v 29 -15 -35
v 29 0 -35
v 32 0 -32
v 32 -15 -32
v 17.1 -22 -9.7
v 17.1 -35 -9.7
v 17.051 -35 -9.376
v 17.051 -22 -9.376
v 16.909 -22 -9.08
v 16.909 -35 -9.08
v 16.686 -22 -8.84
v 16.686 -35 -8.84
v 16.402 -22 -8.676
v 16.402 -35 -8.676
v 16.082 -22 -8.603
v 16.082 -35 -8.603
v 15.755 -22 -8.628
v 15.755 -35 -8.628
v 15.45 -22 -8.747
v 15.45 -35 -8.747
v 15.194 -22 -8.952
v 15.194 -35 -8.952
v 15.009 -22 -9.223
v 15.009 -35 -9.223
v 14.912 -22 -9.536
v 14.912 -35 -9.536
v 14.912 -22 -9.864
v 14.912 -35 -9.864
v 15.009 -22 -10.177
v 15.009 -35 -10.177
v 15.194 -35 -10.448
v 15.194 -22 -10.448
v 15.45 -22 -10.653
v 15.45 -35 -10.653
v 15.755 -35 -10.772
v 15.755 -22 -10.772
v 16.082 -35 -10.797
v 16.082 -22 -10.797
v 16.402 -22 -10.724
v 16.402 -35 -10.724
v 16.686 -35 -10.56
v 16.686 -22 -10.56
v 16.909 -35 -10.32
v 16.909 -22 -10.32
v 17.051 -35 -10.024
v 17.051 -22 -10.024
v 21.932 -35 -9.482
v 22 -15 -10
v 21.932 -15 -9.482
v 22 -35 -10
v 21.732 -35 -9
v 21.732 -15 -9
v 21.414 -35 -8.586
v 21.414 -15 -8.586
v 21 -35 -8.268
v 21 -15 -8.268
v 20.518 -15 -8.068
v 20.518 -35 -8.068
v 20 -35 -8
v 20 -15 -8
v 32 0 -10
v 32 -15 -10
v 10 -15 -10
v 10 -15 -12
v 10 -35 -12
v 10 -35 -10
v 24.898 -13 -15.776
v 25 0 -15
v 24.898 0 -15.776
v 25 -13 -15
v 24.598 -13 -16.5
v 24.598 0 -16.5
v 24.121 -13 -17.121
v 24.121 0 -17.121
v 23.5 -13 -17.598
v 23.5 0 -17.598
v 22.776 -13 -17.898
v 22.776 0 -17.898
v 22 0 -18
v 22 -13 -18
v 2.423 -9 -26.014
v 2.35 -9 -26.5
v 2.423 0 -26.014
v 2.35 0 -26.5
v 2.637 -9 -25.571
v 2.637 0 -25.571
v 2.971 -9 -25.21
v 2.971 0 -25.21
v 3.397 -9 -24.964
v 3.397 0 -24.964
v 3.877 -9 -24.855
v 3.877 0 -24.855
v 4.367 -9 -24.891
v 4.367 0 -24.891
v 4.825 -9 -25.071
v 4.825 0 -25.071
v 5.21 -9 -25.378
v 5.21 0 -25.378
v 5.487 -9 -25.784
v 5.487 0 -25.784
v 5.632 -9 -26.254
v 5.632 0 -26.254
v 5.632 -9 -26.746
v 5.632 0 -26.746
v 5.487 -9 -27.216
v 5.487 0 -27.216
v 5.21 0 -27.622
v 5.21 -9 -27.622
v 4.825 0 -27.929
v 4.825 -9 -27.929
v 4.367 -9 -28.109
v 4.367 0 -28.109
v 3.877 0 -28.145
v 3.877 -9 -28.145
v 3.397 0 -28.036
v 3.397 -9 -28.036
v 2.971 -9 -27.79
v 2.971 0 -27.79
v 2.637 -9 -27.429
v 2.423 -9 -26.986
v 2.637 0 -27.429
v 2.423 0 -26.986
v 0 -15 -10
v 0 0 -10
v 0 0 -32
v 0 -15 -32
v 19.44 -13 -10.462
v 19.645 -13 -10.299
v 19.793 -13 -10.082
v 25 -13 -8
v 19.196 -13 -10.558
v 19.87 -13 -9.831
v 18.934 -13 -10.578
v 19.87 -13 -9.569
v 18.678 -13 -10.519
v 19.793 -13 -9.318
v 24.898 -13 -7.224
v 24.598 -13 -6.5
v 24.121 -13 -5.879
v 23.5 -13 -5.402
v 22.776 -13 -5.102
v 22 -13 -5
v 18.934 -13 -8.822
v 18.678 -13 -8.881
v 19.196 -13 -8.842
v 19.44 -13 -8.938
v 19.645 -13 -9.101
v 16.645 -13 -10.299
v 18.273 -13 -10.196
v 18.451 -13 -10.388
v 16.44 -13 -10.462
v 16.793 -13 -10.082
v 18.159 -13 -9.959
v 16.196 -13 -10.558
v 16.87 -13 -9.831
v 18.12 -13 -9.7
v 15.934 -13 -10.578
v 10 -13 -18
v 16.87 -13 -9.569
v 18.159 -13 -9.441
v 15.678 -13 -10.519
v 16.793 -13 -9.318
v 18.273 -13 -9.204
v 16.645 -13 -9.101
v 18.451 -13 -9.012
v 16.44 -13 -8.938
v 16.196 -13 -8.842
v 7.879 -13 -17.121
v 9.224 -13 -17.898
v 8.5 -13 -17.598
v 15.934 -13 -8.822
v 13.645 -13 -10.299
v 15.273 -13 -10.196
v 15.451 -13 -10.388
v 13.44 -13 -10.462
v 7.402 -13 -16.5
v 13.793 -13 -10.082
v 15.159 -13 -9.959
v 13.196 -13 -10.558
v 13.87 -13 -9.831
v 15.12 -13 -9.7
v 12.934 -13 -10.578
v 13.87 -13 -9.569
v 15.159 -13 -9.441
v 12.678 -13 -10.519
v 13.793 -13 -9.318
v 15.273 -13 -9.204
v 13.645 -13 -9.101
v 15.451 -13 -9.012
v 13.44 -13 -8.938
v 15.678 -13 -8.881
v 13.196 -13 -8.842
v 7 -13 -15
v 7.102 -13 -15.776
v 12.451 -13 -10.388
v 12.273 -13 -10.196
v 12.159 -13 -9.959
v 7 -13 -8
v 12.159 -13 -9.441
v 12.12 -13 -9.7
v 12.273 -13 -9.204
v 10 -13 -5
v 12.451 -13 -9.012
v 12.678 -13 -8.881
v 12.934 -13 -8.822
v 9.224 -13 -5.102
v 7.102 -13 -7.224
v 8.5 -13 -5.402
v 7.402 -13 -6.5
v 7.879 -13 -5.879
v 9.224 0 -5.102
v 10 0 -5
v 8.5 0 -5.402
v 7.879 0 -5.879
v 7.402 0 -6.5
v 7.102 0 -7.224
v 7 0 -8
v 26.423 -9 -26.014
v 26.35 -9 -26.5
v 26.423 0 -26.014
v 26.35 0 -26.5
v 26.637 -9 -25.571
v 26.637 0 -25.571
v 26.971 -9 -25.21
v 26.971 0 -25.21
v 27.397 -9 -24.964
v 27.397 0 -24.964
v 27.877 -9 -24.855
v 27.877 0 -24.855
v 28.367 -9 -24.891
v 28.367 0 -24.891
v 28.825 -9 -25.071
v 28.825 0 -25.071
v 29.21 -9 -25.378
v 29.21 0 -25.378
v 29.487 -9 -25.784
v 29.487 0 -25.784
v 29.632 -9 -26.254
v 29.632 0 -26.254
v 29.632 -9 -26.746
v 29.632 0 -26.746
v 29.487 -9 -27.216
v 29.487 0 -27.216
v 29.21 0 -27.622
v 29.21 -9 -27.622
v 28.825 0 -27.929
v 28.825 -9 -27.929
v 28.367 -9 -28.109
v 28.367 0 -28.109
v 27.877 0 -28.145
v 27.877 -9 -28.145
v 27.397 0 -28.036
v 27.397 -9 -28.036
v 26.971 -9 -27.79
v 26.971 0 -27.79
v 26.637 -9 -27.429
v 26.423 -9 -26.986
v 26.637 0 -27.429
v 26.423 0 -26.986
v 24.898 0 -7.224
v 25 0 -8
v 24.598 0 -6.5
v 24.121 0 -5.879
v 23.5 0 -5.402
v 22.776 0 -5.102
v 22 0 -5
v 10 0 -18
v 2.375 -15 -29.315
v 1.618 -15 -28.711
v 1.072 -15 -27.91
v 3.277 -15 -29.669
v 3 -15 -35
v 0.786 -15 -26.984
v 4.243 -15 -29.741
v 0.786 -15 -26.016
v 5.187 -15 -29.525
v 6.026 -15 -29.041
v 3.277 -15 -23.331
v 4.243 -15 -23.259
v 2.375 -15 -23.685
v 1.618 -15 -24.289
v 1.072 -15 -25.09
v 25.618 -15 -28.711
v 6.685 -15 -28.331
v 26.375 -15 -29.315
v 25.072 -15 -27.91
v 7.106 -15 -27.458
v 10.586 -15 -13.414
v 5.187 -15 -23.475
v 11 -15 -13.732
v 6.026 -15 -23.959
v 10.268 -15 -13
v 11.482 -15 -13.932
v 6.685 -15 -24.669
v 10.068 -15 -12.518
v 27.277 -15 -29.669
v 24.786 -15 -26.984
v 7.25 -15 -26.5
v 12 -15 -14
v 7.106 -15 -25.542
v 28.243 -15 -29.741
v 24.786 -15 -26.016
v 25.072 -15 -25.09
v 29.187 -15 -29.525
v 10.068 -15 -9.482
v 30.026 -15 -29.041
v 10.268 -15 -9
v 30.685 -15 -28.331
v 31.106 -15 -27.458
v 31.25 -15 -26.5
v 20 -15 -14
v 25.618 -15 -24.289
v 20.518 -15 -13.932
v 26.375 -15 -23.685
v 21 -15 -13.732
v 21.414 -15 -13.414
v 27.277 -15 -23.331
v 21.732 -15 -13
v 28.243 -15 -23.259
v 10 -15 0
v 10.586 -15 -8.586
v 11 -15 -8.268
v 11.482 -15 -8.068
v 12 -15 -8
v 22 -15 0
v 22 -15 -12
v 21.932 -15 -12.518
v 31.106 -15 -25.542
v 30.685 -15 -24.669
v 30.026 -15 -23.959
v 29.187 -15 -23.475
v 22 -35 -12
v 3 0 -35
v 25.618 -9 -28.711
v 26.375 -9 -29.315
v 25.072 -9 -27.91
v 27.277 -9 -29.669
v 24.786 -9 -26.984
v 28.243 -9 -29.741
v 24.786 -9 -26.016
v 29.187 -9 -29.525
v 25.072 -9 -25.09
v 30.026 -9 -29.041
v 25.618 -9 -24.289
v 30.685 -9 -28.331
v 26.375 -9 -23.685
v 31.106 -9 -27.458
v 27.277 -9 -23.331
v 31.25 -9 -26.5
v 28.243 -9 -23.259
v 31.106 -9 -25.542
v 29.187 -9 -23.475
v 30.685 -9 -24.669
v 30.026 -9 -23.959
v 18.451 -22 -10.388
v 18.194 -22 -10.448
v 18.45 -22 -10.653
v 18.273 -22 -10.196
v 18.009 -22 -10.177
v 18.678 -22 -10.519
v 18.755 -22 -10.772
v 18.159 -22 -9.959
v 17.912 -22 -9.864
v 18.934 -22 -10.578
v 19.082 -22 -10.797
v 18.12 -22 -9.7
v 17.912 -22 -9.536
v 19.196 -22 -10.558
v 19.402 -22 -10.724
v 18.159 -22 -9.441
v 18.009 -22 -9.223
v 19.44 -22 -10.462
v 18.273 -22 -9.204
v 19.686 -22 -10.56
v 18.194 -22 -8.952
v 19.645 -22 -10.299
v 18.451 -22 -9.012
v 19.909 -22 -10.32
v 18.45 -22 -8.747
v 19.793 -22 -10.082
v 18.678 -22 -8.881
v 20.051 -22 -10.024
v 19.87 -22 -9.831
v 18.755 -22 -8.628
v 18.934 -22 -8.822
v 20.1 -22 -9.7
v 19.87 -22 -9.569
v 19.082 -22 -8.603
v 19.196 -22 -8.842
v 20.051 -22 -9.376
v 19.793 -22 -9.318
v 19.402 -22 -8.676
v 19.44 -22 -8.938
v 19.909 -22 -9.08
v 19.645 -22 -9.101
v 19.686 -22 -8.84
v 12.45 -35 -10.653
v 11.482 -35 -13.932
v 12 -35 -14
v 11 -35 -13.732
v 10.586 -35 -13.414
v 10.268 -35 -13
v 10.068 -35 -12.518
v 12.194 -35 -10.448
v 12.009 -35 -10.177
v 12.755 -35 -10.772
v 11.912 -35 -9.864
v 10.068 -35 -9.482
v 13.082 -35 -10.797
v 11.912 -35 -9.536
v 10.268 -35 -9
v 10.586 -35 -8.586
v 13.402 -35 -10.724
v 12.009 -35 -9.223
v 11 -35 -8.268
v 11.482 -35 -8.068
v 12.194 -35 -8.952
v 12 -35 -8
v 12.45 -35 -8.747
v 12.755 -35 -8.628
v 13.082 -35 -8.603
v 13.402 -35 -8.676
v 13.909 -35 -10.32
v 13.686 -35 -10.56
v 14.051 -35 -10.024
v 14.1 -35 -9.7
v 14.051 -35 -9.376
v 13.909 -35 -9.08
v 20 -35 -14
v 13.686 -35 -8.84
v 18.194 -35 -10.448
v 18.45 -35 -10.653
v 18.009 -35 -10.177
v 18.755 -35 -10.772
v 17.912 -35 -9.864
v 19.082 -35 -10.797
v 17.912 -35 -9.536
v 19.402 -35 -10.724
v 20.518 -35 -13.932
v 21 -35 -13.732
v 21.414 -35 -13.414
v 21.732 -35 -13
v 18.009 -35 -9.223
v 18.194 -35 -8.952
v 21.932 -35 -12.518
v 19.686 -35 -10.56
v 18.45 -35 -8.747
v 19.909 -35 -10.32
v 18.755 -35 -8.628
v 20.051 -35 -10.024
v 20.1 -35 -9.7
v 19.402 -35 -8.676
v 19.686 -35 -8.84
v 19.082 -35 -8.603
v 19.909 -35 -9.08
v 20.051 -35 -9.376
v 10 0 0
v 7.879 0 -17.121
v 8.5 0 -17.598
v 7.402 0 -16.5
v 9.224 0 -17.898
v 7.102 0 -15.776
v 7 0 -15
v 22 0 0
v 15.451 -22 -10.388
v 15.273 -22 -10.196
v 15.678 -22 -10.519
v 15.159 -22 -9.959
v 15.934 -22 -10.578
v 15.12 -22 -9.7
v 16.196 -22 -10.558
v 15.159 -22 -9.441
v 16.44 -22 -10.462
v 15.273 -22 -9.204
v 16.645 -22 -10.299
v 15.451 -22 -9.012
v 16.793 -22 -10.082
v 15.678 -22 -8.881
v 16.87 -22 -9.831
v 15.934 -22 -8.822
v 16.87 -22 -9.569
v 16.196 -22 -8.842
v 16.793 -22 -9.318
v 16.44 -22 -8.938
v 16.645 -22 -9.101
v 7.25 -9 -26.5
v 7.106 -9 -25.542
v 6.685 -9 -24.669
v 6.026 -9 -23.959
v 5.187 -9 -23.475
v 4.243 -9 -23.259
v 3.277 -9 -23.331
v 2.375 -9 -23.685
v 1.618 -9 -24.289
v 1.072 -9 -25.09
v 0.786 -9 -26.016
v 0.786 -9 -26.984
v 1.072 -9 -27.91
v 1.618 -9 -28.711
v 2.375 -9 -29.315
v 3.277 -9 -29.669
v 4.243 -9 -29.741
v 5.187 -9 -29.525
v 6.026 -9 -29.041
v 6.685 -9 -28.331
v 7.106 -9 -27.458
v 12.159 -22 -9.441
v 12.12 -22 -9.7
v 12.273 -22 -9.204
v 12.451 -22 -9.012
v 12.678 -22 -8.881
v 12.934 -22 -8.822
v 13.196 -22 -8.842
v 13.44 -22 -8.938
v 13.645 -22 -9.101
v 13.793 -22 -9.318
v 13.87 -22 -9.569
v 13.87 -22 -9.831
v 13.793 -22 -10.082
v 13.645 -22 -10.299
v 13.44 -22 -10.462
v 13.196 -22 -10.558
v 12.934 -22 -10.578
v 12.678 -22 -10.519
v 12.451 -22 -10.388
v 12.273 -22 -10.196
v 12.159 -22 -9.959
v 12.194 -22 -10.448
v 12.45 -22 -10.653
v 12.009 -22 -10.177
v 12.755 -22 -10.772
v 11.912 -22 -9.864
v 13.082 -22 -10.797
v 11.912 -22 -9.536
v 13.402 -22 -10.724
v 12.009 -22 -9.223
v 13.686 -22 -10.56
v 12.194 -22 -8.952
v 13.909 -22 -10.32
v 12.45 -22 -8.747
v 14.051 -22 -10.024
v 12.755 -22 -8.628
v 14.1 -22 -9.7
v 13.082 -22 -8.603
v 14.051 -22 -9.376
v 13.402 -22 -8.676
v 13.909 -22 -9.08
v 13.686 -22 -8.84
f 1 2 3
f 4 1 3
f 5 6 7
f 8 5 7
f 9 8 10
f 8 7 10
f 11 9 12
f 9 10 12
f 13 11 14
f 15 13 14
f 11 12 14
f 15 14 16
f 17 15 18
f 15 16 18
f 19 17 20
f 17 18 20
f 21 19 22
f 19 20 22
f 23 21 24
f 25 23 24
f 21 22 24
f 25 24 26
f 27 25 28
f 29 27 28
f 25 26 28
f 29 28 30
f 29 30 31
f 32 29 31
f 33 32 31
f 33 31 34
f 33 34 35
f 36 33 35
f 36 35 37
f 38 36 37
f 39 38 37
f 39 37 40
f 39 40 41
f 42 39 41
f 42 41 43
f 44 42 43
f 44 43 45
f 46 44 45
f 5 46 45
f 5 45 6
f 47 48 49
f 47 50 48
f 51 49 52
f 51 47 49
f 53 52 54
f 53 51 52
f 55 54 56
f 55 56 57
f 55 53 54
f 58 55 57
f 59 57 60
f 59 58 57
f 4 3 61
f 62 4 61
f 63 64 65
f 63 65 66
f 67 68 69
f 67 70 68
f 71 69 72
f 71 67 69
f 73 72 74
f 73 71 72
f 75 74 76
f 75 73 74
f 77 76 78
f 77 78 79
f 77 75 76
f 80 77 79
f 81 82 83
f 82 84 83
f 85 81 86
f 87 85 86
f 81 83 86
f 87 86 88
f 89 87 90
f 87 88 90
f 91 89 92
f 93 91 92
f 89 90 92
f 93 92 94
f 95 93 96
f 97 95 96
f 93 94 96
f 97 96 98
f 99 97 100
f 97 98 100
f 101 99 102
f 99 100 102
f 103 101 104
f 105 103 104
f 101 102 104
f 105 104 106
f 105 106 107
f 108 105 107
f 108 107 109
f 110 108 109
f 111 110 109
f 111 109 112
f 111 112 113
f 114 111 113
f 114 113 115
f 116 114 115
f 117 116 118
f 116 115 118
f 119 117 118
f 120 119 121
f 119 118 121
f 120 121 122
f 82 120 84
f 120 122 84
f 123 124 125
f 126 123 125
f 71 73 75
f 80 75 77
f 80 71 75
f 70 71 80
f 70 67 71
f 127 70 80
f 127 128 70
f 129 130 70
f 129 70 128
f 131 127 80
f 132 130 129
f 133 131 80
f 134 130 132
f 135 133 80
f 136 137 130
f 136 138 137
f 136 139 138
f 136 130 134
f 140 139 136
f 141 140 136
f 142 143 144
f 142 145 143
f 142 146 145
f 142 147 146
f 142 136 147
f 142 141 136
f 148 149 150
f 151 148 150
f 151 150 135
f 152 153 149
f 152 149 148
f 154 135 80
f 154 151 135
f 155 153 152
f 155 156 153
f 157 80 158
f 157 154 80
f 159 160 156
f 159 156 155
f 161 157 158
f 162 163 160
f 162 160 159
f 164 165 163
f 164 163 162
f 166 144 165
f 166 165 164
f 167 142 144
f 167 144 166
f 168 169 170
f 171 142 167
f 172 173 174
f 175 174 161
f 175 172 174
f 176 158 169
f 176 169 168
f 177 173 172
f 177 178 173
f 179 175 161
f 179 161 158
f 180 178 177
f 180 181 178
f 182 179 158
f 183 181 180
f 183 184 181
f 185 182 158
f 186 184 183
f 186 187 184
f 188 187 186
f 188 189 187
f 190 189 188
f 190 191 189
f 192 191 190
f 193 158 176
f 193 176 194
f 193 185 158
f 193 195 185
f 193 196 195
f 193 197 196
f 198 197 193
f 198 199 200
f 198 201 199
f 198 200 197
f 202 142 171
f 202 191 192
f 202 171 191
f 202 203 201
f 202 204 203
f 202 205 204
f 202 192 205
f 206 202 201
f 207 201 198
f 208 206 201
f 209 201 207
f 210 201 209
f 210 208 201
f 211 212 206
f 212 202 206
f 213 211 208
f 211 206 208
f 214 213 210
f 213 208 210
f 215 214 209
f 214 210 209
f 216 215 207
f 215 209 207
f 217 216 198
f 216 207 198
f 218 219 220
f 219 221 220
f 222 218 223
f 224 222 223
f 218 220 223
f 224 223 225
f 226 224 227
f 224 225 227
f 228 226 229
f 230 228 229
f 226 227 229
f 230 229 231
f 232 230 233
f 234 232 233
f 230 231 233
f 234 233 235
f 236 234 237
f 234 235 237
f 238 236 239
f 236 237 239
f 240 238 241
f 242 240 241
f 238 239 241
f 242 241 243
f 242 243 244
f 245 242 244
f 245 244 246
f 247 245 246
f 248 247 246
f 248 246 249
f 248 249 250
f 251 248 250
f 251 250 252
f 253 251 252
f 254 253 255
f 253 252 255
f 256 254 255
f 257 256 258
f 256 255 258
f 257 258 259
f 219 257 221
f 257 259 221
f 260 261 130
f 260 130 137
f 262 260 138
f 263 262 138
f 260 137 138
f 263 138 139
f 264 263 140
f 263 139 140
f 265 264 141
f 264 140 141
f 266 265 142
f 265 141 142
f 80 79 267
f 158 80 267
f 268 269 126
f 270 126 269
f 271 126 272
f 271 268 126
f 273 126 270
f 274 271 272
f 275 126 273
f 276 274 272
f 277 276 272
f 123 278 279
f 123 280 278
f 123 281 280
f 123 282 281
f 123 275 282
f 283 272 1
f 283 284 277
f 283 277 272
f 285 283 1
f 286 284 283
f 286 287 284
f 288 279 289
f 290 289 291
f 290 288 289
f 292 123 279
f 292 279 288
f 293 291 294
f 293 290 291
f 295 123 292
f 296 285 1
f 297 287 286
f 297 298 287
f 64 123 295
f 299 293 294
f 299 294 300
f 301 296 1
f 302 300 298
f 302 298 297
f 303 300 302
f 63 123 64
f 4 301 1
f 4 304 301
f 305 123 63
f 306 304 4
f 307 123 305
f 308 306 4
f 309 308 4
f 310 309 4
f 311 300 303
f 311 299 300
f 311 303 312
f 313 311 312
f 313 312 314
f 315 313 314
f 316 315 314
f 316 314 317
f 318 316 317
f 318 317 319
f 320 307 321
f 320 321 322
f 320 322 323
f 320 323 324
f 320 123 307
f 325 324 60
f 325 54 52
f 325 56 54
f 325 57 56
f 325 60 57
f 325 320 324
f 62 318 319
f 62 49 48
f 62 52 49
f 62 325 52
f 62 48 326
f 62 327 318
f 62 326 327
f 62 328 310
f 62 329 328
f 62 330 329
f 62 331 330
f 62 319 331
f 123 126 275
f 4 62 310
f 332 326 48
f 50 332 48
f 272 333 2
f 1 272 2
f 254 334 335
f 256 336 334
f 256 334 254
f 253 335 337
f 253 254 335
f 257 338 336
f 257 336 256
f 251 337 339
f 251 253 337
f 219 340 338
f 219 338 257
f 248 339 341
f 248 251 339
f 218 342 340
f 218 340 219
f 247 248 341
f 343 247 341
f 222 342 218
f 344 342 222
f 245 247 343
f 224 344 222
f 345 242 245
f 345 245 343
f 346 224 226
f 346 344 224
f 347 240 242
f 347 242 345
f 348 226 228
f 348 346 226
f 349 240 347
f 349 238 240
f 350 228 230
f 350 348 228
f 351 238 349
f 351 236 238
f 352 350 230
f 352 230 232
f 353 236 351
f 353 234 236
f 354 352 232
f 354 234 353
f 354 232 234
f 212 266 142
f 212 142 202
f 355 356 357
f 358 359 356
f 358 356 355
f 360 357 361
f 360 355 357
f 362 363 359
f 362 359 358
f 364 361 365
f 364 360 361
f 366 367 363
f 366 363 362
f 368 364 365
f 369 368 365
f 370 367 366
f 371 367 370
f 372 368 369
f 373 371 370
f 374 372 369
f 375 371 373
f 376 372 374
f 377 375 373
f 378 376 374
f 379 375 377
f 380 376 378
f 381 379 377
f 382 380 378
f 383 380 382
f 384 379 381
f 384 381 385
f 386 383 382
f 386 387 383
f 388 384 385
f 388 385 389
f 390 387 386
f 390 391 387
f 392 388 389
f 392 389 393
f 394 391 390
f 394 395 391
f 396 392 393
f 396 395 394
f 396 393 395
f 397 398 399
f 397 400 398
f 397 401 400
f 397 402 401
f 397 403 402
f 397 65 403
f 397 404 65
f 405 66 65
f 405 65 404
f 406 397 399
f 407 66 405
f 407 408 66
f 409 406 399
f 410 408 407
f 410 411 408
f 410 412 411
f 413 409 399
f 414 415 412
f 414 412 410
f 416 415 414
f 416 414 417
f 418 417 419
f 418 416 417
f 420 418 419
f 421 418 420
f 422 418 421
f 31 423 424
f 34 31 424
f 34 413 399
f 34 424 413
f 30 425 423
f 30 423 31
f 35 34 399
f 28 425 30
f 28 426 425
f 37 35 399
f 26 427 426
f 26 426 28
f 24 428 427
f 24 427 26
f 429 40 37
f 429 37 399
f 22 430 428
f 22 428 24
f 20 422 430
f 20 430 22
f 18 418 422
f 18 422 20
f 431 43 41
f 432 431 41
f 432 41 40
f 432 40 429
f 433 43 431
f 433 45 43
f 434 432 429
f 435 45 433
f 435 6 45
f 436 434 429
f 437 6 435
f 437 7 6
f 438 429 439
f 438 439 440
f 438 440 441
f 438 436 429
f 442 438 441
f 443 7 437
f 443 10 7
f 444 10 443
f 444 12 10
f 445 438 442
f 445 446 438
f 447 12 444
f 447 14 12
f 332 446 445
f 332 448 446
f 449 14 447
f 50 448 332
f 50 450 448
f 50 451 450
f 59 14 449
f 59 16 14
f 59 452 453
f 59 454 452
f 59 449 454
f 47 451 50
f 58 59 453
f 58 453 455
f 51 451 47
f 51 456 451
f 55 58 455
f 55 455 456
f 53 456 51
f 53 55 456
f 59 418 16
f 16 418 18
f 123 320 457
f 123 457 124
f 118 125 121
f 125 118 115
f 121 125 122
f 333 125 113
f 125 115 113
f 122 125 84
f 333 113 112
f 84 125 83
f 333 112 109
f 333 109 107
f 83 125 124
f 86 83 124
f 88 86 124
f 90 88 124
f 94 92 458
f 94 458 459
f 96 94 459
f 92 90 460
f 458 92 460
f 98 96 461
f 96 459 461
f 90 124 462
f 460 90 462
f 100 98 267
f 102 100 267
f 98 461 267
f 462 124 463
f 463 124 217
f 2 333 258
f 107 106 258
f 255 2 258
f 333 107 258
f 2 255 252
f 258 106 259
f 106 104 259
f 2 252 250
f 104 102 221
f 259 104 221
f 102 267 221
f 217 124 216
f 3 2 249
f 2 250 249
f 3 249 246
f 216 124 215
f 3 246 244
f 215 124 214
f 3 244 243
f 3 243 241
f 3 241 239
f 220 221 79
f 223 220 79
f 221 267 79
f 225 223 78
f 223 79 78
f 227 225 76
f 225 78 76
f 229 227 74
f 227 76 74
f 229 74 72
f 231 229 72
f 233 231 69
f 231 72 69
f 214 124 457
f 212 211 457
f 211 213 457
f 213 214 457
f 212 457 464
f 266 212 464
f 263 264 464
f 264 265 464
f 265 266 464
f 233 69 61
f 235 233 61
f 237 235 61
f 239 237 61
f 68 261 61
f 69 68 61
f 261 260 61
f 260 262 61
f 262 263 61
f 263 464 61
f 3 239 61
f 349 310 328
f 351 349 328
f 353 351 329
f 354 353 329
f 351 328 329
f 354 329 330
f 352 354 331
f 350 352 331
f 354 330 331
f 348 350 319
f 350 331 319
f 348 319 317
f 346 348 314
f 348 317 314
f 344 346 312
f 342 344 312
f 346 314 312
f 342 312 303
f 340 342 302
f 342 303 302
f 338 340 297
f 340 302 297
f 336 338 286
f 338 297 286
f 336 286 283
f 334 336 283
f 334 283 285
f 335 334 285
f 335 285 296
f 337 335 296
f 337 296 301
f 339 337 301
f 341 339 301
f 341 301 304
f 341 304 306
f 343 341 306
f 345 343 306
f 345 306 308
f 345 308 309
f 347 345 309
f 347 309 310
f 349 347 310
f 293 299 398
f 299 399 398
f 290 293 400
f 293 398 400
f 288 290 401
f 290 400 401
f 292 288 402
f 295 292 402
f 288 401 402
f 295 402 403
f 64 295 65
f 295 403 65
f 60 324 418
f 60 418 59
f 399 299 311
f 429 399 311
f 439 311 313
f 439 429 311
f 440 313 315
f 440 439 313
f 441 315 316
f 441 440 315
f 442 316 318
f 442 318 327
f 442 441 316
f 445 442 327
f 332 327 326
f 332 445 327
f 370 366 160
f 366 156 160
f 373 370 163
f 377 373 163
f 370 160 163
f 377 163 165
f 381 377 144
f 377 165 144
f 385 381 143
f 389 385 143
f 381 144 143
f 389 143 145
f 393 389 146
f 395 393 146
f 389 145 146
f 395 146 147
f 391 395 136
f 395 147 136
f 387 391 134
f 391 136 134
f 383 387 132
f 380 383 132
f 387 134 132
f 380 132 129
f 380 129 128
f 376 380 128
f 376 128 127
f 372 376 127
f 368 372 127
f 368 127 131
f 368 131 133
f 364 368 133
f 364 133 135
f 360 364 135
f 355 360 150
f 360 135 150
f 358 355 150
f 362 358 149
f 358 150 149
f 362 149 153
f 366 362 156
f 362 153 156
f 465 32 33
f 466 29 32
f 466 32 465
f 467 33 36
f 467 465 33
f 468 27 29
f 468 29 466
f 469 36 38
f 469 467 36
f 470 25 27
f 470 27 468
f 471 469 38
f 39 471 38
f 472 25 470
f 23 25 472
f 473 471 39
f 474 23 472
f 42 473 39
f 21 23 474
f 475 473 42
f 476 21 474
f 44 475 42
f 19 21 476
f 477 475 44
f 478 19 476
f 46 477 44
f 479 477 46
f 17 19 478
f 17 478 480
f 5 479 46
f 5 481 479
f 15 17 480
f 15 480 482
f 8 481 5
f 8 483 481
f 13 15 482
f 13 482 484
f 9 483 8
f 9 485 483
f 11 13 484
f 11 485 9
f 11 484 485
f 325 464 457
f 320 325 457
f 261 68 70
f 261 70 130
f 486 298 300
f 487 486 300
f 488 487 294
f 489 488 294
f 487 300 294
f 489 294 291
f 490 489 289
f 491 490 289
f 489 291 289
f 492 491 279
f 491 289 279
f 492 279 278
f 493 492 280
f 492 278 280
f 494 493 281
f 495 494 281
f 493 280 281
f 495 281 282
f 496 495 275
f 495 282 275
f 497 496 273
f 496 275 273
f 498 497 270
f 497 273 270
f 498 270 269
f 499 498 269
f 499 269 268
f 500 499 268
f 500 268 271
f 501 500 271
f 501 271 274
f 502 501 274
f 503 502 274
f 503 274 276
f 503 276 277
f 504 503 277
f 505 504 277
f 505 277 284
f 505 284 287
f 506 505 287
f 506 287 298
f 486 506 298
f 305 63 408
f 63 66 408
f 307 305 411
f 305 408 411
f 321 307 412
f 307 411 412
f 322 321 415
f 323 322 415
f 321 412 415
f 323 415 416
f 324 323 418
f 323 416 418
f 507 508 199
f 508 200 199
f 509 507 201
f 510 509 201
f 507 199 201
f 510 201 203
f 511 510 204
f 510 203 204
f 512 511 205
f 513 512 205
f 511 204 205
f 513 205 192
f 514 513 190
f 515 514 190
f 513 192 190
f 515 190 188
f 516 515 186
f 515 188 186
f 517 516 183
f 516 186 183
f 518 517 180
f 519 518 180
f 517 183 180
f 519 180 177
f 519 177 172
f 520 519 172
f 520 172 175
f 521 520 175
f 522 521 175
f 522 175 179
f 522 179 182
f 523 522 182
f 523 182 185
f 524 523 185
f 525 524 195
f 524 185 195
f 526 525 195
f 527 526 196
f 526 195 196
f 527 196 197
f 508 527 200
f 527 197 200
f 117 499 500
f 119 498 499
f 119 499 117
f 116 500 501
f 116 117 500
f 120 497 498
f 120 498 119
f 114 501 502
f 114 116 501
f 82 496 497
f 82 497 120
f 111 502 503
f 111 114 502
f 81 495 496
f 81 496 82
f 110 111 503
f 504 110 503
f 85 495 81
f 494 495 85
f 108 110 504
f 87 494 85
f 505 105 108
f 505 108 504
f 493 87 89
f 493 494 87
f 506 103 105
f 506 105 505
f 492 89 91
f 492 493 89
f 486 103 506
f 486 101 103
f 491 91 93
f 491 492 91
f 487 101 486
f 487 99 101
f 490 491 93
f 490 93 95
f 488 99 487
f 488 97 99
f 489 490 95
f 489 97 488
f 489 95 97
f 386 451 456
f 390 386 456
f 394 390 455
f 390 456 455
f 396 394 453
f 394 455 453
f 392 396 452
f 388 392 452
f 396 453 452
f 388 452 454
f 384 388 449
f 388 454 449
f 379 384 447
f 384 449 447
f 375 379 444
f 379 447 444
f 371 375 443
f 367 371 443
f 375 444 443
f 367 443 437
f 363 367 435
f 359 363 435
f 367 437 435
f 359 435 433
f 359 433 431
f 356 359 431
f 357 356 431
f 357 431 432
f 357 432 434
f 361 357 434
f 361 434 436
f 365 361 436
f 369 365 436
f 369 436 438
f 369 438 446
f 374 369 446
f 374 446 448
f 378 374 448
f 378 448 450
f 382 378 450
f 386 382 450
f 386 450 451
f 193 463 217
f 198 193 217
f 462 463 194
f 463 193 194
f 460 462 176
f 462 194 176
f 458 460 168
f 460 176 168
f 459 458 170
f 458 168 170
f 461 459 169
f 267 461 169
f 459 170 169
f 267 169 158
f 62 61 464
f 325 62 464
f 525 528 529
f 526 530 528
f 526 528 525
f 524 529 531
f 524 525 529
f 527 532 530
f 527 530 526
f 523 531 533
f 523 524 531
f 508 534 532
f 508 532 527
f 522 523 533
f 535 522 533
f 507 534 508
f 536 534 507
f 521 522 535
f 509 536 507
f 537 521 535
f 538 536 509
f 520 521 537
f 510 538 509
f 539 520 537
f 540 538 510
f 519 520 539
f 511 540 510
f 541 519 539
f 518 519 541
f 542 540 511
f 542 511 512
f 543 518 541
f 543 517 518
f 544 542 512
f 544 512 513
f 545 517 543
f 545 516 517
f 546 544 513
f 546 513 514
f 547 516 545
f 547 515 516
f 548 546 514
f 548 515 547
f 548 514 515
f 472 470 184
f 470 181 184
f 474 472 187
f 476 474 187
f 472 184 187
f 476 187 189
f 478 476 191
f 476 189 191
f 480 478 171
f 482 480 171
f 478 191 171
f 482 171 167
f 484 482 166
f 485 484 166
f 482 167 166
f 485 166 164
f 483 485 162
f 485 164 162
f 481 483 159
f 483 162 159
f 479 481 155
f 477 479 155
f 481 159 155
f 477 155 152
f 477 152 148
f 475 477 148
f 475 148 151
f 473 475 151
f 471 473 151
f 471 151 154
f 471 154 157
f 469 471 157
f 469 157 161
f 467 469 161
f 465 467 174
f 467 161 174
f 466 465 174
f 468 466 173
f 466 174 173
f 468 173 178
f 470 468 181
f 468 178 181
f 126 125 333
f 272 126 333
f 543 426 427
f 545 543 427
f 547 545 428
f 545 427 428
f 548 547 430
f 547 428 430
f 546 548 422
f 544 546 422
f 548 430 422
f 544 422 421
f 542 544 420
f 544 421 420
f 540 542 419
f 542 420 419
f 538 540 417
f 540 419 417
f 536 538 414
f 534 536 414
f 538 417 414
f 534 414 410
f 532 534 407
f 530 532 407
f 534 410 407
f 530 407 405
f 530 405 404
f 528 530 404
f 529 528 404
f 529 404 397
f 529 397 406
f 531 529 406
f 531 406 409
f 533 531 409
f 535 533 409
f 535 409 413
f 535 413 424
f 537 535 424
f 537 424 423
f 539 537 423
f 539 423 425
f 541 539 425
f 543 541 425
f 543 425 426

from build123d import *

# Parameters (mm, degrees)
F1_DEPTH        = 15
F2_W            = 12
F2_H            = 6
F3_DEPTH        = 20
F4_W            = 18
F4_H            = 13
F5_DEPTH        = 13
F6_R            = 3
F7_D            = 3.3
F7_CBORE_D      = 6.5
F7_CBORE_DEPTH  = 6
F9_R            = 2
F10_D           = 1.76
F10_CBORE_D     = 2.2
F10_CBORE_DEPTH = 13


with BuildPart() as f1:
    # F0 (on Front) → F1 (new body)
    with BuildSketch(Plane.XZ):
        Polygon((22, 0), (10, 0), (0, -10), (0, -32), (3, -35), (29, -35), (32, -32), (32, -10), align=None)
    extrude(amount=F1_DEPTH)

    # F2 (on face) → F3 (join)
    with BuildSketch(Plane.XZ.offset(15)):
        with Locations((16, -11)):
            Rectangle(F2_W, F2_H)
    extrude(amount=F3_DEPTH)

    # F4 (on face) → F5 (cut)
    with BuildSketch(Plane(origin=(0, 0, 0), x_dir=(-1, 0, 0), z_dir=(0, 1, 0))):
        with Locations((-16, -11.5)):
            Rectangle(F4_W, F4_H)
    extrude(amount=-F5_DEPTH, mode=Mode.SUBTRACT)

    # F6
    f6_edges = [f1.edges().sort_by_distance(p)[0] for p in [
        (25, -6.5, -5),
        (7, -6.5, -5),
        (25, -6.5, -18),
        (7, -6.5, -18),
    ]]
    fillet(f6_edges, radius=F6_R)

    # F7 (through all)
    with Locations(Plane.XZ.offset(15)):
        with Locations((4, -26.5), (28, -26.5)):
            CounterBoreHole(F7_D / 2, F7_CBORE_D / 2, F7_CBORE_DEPTH)

    # F9
    f9_edges = [f1.edges().sort_by_distance(p)[0] for p in [
        (22, -25, -8),
        (22, -25, -14),
        (10, -25, -8),
        (10, -25, -14),
    ]]
    fillet(f9_edges, radius=F9_R)

    # F10 (through all)
    with Locations(Plane.XZ.offset(35)):
        with Locations((19, -9.7), (16, -9.7), (13, -9.7)):
            CounterBoreHole(F10_D / 2, F10_CBORE_D / 2, F10_CBORE_DEPTH)


solid = f1.part
